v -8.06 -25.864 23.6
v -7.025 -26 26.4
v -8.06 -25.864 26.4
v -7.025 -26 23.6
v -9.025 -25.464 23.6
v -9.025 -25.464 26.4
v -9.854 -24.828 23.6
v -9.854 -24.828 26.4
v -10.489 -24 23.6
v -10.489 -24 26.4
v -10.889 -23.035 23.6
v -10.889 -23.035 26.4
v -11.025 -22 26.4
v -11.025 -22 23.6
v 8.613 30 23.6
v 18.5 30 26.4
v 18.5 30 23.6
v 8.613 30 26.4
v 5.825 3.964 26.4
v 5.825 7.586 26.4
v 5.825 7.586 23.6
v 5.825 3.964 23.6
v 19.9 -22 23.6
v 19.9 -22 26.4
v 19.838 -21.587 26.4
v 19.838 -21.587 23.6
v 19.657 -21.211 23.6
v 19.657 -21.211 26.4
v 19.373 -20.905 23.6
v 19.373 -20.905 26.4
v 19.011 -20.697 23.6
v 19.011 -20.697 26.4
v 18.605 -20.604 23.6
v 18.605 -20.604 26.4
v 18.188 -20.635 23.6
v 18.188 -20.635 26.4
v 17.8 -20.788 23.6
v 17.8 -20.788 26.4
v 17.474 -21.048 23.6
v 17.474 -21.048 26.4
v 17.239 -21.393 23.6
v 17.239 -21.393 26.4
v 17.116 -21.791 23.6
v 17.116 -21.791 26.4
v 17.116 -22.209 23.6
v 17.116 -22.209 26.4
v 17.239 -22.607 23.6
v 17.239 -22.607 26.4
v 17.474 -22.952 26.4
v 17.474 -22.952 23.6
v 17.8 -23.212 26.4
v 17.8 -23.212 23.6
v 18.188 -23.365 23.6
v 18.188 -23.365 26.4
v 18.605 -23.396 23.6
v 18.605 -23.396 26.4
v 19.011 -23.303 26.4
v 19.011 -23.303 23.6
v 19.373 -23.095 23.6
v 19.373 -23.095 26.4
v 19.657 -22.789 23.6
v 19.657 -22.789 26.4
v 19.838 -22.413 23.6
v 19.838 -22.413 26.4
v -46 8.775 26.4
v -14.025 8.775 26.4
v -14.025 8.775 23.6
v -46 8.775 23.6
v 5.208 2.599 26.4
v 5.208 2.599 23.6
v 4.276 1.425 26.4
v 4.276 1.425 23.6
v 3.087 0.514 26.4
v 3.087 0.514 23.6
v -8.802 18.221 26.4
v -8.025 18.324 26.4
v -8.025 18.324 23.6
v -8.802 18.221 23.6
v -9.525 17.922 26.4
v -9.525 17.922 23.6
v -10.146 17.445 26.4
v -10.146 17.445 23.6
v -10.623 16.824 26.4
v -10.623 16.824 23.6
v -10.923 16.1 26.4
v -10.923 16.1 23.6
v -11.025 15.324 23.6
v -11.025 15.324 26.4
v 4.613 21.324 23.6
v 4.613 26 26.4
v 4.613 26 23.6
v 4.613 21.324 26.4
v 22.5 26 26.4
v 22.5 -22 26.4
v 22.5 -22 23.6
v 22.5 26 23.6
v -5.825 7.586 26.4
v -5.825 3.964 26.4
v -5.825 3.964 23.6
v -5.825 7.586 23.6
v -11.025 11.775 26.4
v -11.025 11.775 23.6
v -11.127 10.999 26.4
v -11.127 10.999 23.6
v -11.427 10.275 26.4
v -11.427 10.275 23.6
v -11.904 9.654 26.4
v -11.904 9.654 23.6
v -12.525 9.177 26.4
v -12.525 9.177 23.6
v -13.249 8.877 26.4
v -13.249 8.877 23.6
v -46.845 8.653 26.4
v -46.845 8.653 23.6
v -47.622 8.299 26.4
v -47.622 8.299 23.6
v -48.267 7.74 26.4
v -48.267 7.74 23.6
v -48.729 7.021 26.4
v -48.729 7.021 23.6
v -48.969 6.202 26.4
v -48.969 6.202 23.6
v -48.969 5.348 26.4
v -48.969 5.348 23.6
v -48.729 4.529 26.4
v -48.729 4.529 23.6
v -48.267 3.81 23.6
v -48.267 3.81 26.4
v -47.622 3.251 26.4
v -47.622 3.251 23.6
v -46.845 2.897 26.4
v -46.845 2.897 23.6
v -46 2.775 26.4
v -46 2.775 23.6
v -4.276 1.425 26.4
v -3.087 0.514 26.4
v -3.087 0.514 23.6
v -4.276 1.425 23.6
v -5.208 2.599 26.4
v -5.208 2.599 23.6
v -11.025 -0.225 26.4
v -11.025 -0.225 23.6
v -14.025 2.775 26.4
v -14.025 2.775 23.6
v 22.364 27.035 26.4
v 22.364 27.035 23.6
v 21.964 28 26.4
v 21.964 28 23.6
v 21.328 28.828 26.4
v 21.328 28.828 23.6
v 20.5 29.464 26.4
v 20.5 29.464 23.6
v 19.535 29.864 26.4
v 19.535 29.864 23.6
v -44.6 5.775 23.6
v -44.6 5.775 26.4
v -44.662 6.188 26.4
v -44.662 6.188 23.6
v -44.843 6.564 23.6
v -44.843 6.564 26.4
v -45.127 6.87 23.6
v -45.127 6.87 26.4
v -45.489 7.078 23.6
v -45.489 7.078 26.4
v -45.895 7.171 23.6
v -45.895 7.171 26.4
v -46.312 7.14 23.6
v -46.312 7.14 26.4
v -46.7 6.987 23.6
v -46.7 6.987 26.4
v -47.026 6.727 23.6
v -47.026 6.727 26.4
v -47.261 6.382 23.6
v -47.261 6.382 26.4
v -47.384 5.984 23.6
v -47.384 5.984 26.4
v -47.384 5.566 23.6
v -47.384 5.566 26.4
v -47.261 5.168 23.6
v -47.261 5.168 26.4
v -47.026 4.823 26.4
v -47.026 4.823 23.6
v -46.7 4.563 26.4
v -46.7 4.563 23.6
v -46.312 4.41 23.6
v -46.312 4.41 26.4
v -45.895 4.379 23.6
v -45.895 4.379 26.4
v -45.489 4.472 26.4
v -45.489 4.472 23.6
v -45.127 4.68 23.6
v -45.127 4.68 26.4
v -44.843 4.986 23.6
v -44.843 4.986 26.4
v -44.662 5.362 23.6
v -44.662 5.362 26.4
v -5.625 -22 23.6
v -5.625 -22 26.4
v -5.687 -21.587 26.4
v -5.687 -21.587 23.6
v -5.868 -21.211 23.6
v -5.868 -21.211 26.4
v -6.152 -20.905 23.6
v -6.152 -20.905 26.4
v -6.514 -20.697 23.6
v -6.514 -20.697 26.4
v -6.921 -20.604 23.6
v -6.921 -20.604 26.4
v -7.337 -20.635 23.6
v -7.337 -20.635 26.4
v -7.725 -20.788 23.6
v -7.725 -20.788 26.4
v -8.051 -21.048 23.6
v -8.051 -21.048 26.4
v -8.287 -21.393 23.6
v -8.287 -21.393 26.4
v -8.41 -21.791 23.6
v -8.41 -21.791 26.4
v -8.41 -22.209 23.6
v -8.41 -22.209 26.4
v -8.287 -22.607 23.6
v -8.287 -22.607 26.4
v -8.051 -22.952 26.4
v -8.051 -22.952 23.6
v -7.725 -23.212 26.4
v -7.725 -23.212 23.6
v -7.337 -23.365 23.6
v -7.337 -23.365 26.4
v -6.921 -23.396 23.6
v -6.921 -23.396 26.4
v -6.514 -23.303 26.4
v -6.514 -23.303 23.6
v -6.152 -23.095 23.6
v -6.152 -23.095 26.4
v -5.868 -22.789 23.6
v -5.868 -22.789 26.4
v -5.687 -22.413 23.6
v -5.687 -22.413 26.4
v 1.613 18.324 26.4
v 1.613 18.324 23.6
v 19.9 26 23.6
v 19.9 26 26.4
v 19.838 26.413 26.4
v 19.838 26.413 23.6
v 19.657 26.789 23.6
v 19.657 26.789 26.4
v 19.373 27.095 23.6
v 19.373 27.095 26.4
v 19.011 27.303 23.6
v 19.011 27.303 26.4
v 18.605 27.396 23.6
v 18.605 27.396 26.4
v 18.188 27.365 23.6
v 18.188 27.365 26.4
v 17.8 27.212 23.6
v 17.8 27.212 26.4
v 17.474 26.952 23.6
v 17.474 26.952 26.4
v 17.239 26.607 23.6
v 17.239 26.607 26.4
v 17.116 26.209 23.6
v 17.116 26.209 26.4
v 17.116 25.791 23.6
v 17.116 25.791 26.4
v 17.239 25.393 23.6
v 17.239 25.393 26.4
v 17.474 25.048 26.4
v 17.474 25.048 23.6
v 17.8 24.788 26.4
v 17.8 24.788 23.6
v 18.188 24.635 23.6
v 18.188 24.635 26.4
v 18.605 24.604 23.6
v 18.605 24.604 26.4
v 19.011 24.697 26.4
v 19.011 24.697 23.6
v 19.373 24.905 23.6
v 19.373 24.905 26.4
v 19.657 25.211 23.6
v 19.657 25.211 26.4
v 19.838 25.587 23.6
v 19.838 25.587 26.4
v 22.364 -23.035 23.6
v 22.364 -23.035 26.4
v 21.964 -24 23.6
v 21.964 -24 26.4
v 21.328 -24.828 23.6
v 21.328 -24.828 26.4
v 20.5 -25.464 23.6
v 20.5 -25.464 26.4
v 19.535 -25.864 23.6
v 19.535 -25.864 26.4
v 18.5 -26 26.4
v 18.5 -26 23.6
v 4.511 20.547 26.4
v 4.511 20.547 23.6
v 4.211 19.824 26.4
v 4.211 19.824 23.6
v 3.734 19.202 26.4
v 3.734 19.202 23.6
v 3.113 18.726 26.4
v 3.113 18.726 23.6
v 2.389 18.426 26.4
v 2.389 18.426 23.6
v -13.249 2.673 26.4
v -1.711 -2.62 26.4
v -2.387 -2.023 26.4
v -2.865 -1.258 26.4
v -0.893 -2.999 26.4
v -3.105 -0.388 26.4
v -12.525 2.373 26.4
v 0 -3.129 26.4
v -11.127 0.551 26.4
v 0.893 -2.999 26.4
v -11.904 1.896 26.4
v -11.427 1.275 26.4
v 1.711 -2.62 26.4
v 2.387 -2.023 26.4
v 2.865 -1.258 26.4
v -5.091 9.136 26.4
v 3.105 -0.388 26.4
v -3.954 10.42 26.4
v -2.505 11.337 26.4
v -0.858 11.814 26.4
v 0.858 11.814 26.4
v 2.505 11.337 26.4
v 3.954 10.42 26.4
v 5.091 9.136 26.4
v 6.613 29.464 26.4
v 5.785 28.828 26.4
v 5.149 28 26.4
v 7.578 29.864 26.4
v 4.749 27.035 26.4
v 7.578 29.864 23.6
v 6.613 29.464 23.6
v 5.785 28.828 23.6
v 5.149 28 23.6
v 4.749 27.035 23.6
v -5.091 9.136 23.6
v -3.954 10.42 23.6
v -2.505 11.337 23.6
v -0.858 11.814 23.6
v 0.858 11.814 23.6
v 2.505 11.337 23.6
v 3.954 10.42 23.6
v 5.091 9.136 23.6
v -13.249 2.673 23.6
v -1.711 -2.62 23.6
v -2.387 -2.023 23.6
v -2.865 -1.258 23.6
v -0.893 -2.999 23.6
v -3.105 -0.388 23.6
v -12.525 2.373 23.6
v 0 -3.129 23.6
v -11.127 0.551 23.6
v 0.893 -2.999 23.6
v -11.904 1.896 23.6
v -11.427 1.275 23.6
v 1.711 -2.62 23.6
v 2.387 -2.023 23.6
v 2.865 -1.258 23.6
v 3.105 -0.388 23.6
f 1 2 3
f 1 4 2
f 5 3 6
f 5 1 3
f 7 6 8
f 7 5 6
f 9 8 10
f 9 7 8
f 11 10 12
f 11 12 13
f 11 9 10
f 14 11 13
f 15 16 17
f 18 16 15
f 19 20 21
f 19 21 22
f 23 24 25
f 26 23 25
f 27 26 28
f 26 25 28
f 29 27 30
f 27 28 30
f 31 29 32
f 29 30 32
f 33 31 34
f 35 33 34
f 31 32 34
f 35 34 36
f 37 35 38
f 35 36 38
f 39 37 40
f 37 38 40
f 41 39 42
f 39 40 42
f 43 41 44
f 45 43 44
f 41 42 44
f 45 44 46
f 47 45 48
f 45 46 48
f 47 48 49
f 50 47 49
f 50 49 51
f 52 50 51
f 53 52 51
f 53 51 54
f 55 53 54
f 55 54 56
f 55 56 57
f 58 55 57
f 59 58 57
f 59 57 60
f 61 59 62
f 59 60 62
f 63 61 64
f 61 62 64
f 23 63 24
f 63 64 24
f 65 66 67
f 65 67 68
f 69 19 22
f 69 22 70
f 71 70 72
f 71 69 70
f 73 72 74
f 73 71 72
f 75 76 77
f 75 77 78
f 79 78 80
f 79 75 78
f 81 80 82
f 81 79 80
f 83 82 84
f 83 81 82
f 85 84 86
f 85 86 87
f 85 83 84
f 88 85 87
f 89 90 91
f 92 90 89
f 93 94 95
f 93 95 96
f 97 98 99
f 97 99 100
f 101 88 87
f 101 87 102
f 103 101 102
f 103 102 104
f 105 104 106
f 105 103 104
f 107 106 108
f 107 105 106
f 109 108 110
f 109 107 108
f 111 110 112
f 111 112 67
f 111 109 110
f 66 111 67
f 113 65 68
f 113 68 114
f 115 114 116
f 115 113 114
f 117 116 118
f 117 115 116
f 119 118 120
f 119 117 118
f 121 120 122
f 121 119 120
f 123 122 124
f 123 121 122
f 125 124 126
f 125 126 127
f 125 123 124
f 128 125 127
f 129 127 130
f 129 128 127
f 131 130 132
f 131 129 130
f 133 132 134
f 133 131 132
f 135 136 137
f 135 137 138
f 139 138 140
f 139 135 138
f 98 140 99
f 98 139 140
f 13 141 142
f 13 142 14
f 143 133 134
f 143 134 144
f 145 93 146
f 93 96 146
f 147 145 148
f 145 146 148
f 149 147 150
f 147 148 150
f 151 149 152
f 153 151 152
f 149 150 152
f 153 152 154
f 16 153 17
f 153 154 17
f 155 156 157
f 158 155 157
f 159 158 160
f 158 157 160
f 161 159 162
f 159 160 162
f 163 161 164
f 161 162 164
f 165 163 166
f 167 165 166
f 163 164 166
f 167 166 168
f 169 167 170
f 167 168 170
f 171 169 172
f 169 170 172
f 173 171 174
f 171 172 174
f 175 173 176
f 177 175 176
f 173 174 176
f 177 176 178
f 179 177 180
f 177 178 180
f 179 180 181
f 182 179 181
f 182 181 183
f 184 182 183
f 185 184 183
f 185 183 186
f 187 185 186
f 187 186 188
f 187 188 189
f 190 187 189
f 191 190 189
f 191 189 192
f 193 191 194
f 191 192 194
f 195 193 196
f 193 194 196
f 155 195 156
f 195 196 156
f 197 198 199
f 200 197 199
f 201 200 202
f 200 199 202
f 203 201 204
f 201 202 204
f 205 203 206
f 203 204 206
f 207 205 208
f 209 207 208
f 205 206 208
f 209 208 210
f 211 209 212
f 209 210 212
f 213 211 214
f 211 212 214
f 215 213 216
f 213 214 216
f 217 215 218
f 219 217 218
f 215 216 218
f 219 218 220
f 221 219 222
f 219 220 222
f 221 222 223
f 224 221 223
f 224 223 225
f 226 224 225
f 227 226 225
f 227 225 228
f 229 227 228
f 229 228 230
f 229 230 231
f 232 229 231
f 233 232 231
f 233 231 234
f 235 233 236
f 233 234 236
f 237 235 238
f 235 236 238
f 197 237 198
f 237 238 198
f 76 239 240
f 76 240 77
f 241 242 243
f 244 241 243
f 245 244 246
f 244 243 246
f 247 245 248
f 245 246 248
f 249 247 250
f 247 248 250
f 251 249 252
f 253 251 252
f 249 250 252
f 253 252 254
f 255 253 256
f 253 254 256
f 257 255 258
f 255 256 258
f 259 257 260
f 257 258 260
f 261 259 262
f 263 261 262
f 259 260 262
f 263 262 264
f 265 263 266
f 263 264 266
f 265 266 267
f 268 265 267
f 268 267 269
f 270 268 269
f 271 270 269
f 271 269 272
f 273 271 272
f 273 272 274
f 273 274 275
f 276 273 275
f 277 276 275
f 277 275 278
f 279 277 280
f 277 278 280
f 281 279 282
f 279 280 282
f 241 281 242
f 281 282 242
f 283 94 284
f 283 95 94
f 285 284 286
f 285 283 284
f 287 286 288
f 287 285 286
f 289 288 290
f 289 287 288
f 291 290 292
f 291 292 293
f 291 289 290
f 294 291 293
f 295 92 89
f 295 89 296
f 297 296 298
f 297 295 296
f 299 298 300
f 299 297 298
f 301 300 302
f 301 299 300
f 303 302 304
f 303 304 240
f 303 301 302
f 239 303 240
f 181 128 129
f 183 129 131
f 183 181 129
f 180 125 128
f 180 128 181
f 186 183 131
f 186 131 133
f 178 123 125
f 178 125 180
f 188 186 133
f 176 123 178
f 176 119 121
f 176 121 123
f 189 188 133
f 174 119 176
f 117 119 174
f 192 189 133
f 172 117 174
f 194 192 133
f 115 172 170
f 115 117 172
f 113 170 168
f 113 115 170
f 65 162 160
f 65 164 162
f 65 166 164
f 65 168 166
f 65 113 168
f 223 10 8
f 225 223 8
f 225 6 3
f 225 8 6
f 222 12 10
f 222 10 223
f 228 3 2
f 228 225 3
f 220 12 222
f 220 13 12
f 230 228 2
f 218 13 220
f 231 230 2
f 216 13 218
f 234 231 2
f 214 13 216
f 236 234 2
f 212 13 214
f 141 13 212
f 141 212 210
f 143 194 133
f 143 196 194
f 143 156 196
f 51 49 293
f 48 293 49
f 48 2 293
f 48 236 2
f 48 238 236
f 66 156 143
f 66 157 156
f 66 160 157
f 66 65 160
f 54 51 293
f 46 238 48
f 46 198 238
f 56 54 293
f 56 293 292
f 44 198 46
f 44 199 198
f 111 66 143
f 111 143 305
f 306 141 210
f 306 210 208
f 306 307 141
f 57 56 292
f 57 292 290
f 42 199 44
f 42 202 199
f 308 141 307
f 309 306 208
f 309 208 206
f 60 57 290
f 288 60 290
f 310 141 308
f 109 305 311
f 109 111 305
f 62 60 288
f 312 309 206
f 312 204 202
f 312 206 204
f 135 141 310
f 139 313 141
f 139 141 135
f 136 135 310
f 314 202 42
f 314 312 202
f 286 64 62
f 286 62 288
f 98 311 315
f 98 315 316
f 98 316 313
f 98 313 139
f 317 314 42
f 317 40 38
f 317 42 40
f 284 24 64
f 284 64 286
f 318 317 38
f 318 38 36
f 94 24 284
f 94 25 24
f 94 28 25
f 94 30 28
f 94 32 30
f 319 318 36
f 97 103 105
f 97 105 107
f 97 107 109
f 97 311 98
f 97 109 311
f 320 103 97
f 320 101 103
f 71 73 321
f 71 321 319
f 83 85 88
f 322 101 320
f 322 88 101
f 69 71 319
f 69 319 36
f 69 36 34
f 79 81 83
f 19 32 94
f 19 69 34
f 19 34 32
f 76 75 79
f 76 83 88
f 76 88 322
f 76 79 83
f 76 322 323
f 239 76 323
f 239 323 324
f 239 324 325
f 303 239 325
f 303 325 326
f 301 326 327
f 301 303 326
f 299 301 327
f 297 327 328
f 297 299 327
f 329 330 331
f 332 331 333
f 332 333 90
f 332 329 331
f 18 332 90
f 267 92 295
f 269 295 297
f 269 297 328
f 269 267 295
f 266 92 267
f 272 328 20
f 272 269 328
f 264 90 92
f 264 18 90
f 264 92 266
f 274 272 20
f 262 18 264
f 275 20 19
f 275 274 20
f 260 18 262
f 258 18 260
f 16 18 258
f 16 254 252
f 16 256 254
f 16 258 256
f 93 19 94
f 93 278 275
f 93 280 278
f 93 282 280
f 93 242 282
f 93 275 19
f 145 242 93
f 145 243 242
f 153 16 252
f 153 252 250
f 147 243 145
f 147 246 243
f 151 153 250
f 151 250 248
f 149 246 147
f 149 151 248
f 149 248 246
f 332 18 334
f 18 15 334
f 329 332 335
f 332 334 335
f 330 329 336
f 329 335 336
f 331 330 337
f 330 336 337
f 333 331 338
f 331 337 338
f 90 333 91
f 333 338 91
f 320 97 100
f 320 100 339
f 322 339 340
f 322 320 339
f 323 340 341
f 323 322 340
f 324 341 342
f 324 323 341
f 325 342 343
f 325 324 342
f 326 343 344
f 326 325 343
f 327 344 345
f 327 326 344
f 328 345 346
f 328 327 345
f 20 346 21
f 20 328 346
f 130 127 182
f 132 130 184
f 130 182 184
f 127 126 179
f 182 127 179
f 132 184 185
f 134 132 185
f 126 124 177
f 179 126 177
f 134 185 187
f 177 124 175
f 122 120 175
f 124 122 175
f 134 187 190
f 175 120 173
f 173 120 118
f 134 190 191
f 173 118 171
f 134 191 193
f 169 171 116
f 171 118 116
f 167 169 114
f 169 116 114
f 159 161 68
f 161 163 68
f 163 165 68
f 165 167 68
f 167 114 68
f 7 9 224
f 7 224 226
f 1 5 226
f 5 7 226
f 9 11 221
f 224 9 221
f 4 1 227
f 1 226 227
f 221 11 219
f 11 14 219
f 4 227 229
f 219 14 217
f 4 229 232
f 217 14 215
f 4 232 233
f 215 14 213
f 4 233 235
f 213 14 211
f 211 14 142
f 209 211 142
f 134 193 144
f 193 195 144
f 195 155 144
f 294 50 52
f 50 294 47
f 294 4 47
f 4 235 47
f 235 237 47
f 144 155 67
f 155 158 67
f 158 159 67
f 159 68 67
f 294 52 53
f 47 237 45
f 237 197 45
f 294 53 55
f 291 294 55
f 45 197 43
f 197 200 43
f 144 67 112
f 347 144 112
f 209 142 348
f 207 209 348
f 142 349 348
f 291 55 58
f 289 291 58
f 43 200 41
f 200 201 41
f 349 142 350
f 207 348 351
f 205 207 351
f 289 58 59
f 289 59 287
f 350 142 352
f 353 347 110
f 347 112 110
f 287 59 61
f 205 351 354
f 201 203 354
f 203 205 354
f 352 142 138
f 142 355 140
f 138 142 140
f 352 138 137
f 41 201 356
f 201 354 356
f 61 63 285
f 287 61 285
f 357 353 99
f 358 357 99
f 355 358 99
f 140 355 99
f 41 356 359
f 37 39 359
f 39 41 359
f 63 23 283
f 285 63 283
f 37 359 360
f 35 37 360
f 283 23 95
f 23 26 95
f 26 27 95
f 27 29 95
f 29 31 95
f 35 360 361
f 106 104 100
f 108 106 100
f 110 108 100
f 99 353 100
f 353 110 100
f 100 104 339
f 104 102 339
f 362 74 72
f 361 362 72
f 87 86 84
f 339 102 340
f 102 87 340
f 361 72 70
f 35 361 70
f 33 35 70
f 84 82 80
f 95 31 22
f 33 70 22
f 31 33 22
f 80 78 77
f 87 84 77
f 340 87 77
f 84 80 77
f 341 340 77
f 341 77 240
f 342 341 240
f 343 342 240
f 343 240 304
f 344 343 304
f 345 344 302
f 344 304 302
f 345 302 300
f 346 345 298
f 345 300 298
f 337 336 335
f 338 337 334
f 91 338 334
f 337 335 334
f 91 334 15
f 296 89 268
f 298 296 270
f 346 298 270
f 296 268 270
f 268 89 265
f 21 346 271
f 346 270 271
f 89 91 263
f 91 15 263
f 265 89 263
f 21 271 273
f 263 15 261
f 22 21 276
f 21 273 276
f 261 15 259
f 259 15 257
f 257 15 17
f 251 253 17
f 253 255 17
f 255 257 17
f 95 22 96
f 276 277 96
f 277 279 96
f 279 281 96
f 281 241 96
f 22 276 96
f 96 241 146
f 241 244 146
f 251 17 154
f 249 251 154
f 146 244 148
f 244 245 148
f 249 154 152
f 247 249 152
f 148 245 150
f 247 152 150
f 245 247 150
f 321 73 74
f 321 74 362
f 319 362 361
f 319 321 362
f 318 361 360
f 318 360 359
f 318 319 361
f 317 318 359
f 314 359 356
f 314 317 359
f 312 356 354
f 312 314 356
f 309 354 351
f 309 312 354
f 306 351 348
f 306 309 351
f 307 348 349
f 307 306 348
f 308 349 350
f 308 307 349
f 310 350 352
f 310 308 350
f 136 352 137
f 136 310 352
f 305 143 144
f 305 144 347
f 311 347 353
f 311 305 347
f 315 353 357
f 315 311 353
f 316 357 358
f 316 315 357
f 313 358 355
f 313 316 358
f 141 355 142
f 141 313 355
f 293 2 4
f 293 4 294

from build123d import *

# Parameters (mm, degrees)
F0_W     = 11.65
F0_H     = 23.75
F1_DEPTH = 20.4
F3_DEPTH = 6
F5_START = -0.8
F4_W     = 11.65
F4_H     = 4.2
F5_DEPTH = 2
F6_R     = 0.5
F7_R     = 1
F8_R     = 1.4
F9_DEPTH = 2.8
F10_R    = 4


# Not quite as in the source:
# - a feature names something its author has since deleted; it is built from what else it names


with BuildPart() as f1:
    # F0 (on Top) → F1 (new body)
    with BuildSketch(Plane.XY):
        Rectangle(F0_W, F0_H)
    extrude(amount=F1_DEPTH)

    # F2 (on face) → F3 (join)
    with BuildSketch(Plane.XY.offset(20.4)):
        with BuildLine():
            Line((5.825, 3.9640955299), (5.825, 7.5859044701))
            ThreePointArc((5.825, 7.5859044701), (0, 11.875), (-5.825, 7.5859044701))
            Line((-5.825, 7.5859044701), (-5.825, 3.9640955299))
            ThreePointArc((-5.825, 3.9640955299), (-4.7781429098, 1.9829886164), (-3.0865775367, 0.5135326087))
            ThreePointArc((-3.0865775367, 0.5135326087), (0, -3.1), (3.0865775367, 0.5135326087))
            ThreePointArc((3.0865775367, 0.5135326087), (4.7781429098, 1.9829886164), (5.825, 3.9640955299))
        make_face()
    extrude(amount=F3_DEPTH)

    # F4 (on face) → F5 (join)
    with BuildSketch(Plane.XY.offset(20.4).offset(F5_START)):
        with Locations((0, -13.975)):
            Rectangle(F4_W, F4_H)
        with Locations((0, 13.975)):
            Rectangle(F4_W, F4_H)
    extrude(amount=-F5_DEPTH)

    # F6
    f6_edges = [f1.edges().sort_by_distance(p)[0] for p in [
        (5.825, 11.875, 8.8),
        (5.825, -11.875, 8.8),
        (-5.825, -11.875, 8.8),
        (-5.825, 11.875, 8.8),
    ]]
    fillet(f6_edges, radius=F6_R)

    # F7
    f7_edges = [f1.edges().sort_by_distance(p)[0] for p in [
        (-5.825, 16.075, 18.6),
        (5.825, 16.075, 18.6),
        (5.825, -16.075, 18.6),
        (-5.825, -16.075, 18.6),
    ]]
    fillet(f7_edges, radius=F7_R)


with BuildPart() as f9:
    # F8 (on face) → F9 (new body)
    with BuildSketch(Plane.XY.offset(26.4)):
        with BuildLine():
            Line((22.5, -26), (22.5, 30))
            Line((22.5, 30), (4.6129450202, 30))
            Line((4.6129450202, 30), (4.6129450202, 21.3236394078))
            ThreePointArc((4.6129450202, 21.3236394078), (3.7342653638, 19.2023190642), (1.6129450202, 18.3236394078))
            Line((1.6129450202, 18.3236394078), (-8.0251465812, 18.3236394078))
            ThreePointArc((-8.0251465812, 18.3236394078), (-10.1464669248, 17.4449597513), (-11.0251465812, 15.3236394078))
            Line((-11.0251465812, 15.3236394078), (-11.0251465812, 11.775))
            ThreePointArc((-11.0251465812, 11.775), (-11.9038262377, 9.6536796564), (-14.0251465812, 8.775))
            Line((-14.0251465812, 8.775), (-46, 8.775))
            ThreePointArc((-46, 8.775), (-49, 5.775), (-46, 2.775))
            Line((-46, 2.775), (-14.0251465812, 2.775))
            ThreePointArc((-14.0251465812, 2.775), (-11.9038262377, 1.8963203436), (-11.0251465812, -0.225))
            Line((-11.0251465812, -0.225), (-11.0251465812, -15.0673655123))
            Line((-11.0251465812, -15.0673655123), (-11.0251465812, -26))
            Line((-11.0251465812, -26), (22.5, -26))
        make_face()
        with Locations((-7.0251465812, -22)):
            Circle(F8_R, mode=Mode.SUBTRACT)
        with Locations((18.5, -22)):
            Circle(F8_R, mode=Mode.SUBTRACT)
        with Locations((-46, 5.775)):
            Circle(F8_R, mode=Mode.SUBTRACT)
        with BuildLine():
            ThreePointArc((5.825, 3.9640955299), (4.7781429098, 1.9829886164), (3.0865775367, 0.5135326087))
            ThreePointArc((3.0865775367, 0.5135326087), (0, -3.1290056936), (-3.0865775367, 0.5135326087))
            ThreePointArc((-3.0865775367, 0.5135326087), (-4.7781429098, 1.9829886164), (-5.825, 3.9640955299))
            Line((-5.825, 3.9640955299), (-5.825, 7.5859044701))
            ThreePointArc((-5.825, 7.5859044701), (0, 11.875), (5.825, 7.5859044701))
            Line((5.825, 7.5859044701), (5.825, 3.9640955299))
        make_face(mode=Mode.SUBTRACT)
        with Locations((18.5, 26)):
            Circle(F8_R, mode=Mode.SUBTRACT)
    extrude(amount=-F9_DEPTH)

    # F10
    f10_edges = [f9.edges().sort_by_distance(p)[0] for p in [
        (22.5, 30, 25),
        (-11.025147, -26, 25),
        (22.5, -26, 25),
        (4.612945, 30, 25),
    ]]
    fillet(f10_edges, radius=F10_R)


with BuildPart() as f11_1:
    # F11: copy of F9
    add(f9.part)


solid = f9.part
